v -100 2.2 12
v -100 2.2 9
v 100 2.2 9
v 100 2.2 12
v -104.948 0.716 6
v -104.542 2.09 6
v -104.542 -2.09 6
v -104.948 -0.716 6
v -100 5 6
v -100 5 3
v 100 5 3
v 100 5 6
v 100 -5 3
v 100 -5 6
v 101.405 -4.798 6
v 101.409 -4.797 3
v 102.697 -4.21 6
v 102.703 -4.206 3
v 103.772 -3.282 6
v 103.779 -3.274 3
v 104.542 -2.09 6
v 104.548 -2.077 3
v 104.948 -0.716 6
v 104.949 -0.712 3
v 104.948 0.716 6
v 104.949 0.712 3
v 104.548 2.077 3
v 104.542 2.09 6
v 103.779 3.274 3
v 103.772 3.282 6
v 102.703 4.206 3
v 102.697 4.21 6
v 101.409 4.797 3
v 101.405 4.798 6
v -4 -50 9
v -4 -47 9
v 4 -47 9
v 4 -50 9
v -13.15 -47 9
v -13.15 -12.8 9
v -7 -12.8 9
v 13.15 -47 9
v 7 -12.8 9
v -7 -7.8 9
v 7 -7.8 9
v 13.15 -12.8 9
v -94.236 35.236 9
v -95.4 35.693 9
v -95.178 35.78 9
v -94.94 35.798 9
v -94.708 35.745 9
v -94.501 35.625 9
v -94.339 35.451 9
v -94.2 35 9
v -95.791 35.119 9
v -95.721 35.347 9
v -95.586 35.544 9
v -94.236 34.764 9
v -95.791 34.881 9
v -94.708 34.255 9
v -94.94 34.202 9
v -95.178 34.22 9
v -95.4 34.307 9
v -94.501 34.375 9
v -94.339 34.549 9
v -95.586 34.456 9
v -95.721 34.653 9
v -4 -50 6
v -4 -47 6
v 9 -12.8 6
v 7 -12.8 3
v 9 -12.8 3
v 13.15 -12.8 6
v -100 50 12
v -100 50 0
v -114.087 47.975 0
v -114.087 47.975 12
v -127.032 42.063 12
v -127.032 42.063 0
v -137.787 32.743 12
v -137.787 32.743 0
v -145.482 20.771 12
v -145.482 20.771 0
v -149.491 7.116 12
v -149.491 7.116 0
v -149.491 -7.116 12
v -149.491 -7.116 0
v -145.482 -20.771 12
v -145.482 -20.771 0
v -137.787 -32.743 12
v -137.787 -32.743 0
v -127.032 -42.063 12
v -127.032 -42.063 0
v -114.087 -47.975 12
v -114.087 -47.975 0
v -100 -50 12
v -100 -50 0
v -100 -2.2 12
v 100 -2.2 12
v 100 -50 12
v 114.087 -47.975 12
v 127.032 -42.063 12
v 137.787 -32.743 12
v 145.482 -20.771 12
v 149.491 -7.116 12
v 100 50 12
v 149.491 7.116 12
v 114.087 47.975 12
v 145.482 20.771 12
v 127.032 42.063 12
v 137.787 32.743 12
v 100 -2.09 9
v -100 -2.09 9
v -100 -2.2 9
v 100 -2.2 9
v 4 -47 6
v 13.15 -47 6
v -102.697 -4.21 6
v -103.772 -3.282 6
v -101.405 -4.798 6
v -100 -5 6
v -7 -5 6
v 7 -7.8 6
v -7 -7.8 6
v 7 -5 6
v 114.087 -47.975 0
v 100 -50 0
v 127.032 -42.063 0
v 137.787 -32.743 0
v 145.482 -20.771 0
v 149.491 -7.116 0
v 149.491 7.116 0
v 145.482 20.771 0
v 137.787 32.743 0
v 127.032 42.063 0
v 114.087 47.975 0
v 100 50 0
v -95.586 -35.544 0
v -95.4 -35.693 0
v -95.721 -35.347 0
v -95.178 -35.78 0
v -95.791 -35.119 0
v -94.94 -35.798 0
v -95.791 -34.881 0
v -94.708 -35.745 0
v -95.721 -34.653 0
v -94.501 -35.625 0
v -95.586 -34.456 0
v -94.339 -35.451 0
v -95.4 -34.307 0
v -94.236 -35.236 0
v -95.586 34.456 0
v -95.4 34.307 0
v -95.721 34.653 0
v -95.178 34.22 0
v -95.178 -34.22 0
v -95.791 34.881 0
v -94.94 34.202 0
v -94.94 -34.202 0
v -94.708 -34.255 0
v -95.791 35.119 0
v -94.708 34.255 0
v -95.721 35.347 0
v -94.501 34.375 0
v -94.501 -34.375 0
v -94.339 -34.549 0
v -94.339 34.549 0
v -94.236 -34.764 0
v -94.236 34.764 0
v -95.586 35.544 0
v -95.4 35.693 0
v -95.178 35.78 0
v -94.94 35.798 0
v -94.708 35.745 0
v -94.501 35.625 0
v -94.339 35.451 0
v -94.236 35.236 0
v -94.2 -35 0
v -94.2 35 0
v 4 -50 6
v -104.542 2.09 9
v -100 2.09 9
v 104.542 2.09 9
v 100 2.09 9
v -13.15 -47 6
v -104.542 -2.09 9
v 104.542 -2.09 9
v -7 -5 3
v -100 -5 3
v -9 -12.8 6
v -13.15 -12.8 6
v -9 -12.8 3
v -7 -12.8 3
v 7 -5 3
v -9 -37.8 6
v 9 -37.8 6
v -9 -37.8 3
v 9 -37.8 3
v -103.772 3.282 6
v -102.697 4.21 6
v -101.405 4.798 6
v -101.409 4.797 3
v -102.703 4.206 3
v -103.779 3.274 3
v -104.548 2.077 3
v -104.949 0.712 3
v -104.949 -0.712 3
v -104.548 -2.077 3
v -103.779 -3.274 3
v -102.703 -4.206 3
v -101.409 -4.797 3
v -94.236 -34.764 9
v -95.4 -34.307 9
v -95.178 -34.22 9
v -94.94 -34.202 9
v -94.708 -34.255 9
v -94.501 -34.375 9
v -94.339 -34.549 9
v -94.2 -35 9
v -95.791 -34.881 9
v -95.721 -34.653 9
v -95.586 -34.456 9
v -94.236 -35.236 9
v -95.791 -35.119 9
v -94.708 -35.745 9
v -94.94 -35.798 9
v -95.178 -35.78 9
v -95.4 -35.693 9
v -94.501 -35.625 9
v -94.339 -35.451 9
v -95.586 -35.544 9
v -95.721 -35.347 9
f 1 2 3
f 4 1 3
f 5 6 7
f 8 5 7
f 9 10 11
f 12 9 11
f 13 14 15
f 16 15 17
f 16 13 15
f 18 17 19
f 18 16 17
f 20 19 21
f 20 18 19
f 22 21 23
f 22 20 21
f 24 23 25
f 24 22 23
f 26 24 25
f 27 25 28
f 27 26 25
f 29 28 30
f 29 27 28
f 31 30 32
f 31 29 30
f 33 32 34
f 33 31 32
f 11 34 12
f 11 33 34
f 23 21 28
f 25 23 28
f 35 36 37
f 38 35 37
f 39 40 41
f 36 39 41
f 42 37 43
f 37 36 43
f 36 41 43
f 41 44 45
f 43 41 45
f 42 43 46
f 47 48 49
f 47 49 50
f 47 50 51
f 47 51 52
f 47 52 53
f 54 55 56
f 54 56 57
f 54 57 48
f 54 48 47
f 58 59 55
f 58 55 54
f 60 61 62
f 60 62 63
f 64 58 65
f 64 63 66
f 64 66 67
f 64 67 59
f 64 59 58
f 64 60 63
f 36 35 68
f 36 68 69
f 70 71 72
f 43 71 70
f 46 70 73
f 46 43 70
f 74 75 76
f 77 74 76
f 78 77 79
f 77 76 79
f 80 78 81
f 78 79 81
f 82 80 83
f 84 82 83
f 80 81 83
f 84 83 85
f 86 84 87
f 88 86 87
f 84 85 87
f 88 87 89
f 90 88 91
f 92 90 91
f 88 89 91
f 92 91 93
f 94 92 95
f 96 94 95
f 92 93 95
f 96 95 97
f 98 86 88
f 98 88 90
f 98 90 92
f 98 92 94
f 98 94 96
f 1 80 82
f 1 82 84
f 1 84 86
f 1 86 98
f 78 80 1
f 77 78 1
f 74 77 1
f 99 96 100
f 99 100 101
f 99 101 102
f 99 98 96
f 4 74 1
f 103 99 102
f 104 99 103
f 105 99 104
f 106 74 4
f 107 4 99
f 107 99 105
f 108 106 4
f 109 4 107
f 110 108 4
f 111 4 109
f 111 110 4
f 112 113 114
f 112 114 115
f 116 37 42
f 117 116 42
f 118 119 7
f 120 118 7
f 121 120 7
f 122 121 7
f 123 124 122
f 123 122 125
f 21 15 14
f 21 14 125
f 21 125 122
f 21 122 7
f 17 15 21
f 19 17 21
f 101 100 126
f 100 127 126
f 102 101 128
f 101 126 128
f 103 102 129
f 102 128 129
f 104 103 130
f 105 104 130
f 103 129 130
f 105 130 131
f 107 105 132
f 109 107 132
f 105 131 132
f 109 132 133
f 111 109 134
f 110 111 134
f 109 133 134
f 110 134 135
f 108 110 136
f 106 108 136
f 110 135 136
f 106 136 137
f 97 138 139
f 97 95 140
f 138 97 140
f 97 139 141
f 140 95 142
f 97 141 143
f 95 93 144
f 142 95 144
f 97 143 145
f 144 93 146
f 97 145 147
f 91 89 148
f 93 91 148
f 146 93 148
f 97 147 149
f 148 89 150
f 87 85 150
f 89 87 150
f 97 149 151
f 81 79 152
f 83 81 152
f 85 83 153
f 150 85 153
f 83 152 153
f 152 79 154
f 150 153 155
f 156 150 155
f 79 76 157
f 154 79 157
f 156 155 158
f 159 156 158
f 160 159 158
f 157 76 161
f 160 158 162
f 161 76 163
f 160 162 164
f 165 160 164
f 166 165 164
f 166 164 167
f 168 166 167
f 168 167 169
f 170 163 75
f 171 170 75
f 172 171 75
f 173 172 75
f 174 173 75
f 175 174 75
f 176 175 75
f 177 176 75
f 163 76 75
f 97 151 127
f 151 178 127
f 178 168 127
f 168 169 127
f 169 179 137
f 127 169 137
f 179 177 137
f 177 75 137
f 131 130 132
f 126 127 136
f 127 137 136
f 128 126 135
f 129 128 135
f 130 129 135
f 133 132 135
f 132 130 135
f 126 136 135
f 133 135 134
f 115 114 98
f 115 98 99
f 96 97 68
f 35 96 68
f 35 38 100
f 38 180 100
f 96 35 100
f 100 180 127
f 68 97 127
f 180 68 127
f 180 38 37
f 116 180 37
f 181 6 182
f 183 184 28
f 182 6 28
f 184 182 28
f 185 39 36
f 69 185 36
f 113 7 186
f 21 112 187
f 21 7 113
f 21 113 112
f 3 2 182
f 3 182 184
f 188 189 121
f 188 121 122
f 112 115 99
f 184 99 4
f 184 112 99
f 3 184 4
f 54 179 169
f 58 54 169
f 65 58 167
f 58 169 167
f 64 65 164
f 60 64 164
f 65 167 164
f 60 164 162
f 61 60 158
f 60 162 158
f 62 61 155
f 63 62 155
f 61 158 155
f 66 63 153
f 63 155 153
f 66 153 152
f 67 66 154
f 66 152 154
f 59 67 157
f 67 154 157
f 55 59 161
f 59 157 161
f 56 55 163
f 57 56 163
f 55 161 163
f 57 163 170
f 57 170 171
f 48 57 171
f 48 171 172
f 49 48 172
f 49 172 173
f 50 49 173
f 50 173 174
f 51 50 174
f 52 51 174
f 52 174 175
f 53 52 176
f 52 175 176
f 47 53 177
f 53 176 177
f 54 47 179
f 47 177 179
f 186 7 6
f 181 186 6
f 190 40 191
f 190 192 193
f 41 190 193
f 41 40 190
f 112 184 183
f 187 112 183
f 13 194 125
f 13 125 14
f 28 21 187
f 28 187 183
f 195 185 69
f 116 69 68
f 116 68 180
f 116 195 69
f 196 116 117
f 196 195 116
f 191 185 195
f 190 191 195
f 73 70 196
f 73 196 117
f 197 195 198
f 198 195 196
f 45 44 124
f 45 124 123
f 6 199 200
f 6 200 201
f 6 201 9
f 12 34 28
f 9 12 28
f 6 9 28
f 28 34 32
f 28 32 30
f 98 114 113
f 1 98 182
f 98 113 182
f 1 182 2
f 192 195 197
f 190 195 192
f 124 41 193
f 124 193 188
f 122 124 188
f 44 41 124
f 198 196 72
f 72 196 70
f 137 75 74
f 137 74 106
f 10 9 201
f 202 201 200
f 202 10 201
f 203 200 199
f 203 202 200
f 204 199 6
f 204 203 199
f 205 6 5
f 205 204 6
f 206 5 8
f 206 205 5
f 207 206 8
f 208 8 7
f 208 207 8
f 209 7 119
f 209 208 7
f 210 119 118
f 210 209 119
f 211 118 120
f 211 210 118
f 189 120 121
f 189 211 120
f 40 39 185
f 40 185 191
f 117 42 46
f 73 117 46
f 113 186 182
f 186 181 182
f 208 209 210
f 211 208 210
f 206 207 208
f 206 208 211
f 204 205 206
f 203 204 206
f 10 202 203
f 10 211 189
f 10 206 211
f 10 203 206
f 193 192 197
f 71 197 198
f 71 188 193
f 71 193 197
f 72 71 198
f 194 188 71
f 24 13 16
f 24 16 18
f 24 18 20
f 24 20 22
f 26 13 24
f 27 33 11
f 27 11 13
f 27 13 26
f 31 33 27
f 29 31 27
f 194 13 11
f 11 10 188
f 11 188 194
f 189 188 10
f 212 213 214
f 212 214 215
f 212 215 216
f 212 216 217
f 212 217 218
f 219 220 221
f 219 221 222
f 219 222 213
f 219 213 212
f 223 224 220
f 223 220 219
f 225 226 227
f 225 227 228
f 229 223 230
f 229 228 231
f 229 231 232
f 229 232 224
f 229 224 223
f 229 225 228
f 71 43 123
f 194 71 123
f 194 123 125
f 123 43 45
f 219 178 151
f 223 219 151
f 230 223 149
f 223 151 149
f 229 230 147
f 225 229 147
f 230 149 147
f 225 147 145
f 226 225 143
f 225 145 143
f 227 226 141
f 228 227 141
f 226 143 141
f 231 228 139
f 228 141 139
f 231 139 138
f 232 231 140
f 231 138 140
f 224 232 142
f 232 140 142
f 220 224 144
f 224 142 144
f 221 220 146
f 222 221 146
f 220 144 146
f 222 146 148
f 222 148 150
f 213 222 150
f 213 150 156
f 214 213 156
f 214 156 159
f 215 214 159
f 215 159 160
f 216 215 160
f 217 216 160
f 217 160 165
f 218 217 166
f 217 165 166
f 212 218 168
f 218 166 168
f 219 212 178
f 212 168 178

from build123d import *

# Parameters (mm, degrees)
PAD_DEPTH       = 3
PAD001_DEPTH    = 3
SKETCH002_W     = 209.08447
SKETCH002_H     = 4.18
PAD002_DEPTH    = 3
SKETCH003_W     = 26.3
SKETCH003_H     = 34.2
POCKET_DEPTH    = 3
SKETCH004_W     = 18
SKETCH004_H     = 25
POCKET001_DEPTH = 3
SKETCH005_W     = 14
SKETCH005_H     = 5
POCKET002_DEPTH = 6
SKETCH006_W     = 14
SKETCH006_H     = 3
POCKET003_DEPTH = 3
SKETCH007_W     = 8
SKETCH007_H     = 3
POCKET004_DEPTH = 3
SKETCH008_W     = 200
SKETCH008_H     = 4.4
PAD003_DEPTH    = 3
SKETCH009_R     = 0.8
POCKET005_DEPTH = 9


with BuildPart() as part:
    # Sketch → Pad (new body)
    with BuildSketch(Plane.XY):
        with BuildLine():
            ThreePointArc((-100, 50), (-150, 0), (-100, -50))
            Line((-100, -50), (100, -50))
            ThreePointArc((100, -50), (150, 0), (100, 50))
            Line((-100, 50), (100, 50))
        make_face()
    extrude(amount=PAD_DEPTH)

    # Sketch001 (on Face6 of Pad) → Pad001 (join)
    with BuildSketch(Plane.XY.offset(3)):
        with BuildLine():
            ThreePointArc((-100, 50), (-150, 0), (-100, -50))
            Line((-100, -50), (100, -50))
            ThreePointArc((100, -50), (150, 0), (100, 50))
            Line((-100, 50), (100, 50))
        make_face()
        with BuildLine():
            ThreePointArc((-100, 5), (-105, 0), (-100, -5))
            Line((-100, -5), (100, -5))
            ThreePointArc((100, -5), (105, 0), (100, 5))
            Line((-100, 5), (100, 5))
        make_face(mode=Mode.SUBTRACT)
    extrude(amount=PAD001_DEPTH)

    # Sketch002 (on Face9 of Pad001) → Pad002 (join)
    with BuildSketch(Plane.XY.offset(6)):
        with BuildLine():
            ThreePointArc((-100, 50), (-150, 0), (-100, -50))
            Line((-100, -50), (100, -50))
            ThreePointArc((100, -50), (150, 0), (100, 50))
            Line((-100, 50), (100, 50))
        make_face()
        Rectangle(SKETCH002_W, SKETCH002_H, mode=Mode.SUBTRACT)
    extrude(amount=PAD002_DEPTH)

    # Sketch003 (on Face13 of Pad002) → Pocket (cut)
    with BuildSketch(Plane.XY.offset(9)):
        with Locations((0, -29.9)):
            Rectangle(SKETCH003_W, SKETCH003_H)
    extrude(amount=-POCKET_DEPTH, mode=Mode.SUBTRACT)

    # Sketch004 (on Face27 of Pocket) → Pocket001 (cut)
    with BuildSketch(Plane.XY.offset(6)):
        with Locations((0, -25.3)):
            Rectangle(SKETCH004_W, SKETCH004_H)
    extrude(amount=-POCKET001_DEPTH, mode=Mode.SUBTRACT)

    # Sketch005 (on Face13 of Pocket001) → Pocket002 (cut)
    with BuildSketch(Plane.XY.offset(9)):
        with Locations((0, -10.3)):
            Rectangle(SKETCH005_W, SKETCH005_H)
    extrude(amount=-POCKET002_DEPTH, mode=Mode.SUBTRACT)

    # Sketch006 (on Face23 of Pocket002) → Pocket003 (cut)
    with BuildSketch(Plane.XZ.offset(7.8)):
        with Locations((0, 4.5)):
            Rectangle(SKETCH006_W, SKETCH006_H)
    extrude(amount=-POCKET003_DEPTH, mode=Mode.SUBTRACT)

    # Sketch007 (on Face13 of Pocket003) → Pocket004 (cut)
    with BuildSketch(Plane.XY.offset(9)):
        with Locations((0, -48.5)):
            Rectangle(SKETCH007_W, SKETCH007_H)
    extrude(amount=-POCKET004_DEPTH, mode=Mode.SUBTRACT)

    # Sketch008 (on Face15 of Pocket004) → Pad003 (join)
    with BuildSketch(Plane.XY.offset(9)):
        with BuildLine():
            ThreePointArc((-100, 50), (-150, 0), (-100, -50))
            Line((-100, -50), (100, -50))
            ThreePointArc((100, -50), (150, 0), (100, 50))
            Line((-100, 50), (100, 50))
        make_face()
        Rectangle(SKETCH008_W, SKETCH008_H, mode=Mode.SUBTRACT)
    extrude(amount=PAD003_DEPTH)

    # Sketch009 (on Face4 of Pad003) → Pocket005 (cut)
    with BuildSketch(Plane(origin=(0, 0, 0), x_dir=(1, 0, 0), z_dir=(0, 0, -1))):
        with Locations((-95, 35)):
            Circle(SKETCH009_R)
        with Locations((-95, -35)):
            Circle(SKETCH009_R)
    extrude(amount=-POCKET005_DEPTH, mode=Mode.SUBTRACT)


solid = part.part
